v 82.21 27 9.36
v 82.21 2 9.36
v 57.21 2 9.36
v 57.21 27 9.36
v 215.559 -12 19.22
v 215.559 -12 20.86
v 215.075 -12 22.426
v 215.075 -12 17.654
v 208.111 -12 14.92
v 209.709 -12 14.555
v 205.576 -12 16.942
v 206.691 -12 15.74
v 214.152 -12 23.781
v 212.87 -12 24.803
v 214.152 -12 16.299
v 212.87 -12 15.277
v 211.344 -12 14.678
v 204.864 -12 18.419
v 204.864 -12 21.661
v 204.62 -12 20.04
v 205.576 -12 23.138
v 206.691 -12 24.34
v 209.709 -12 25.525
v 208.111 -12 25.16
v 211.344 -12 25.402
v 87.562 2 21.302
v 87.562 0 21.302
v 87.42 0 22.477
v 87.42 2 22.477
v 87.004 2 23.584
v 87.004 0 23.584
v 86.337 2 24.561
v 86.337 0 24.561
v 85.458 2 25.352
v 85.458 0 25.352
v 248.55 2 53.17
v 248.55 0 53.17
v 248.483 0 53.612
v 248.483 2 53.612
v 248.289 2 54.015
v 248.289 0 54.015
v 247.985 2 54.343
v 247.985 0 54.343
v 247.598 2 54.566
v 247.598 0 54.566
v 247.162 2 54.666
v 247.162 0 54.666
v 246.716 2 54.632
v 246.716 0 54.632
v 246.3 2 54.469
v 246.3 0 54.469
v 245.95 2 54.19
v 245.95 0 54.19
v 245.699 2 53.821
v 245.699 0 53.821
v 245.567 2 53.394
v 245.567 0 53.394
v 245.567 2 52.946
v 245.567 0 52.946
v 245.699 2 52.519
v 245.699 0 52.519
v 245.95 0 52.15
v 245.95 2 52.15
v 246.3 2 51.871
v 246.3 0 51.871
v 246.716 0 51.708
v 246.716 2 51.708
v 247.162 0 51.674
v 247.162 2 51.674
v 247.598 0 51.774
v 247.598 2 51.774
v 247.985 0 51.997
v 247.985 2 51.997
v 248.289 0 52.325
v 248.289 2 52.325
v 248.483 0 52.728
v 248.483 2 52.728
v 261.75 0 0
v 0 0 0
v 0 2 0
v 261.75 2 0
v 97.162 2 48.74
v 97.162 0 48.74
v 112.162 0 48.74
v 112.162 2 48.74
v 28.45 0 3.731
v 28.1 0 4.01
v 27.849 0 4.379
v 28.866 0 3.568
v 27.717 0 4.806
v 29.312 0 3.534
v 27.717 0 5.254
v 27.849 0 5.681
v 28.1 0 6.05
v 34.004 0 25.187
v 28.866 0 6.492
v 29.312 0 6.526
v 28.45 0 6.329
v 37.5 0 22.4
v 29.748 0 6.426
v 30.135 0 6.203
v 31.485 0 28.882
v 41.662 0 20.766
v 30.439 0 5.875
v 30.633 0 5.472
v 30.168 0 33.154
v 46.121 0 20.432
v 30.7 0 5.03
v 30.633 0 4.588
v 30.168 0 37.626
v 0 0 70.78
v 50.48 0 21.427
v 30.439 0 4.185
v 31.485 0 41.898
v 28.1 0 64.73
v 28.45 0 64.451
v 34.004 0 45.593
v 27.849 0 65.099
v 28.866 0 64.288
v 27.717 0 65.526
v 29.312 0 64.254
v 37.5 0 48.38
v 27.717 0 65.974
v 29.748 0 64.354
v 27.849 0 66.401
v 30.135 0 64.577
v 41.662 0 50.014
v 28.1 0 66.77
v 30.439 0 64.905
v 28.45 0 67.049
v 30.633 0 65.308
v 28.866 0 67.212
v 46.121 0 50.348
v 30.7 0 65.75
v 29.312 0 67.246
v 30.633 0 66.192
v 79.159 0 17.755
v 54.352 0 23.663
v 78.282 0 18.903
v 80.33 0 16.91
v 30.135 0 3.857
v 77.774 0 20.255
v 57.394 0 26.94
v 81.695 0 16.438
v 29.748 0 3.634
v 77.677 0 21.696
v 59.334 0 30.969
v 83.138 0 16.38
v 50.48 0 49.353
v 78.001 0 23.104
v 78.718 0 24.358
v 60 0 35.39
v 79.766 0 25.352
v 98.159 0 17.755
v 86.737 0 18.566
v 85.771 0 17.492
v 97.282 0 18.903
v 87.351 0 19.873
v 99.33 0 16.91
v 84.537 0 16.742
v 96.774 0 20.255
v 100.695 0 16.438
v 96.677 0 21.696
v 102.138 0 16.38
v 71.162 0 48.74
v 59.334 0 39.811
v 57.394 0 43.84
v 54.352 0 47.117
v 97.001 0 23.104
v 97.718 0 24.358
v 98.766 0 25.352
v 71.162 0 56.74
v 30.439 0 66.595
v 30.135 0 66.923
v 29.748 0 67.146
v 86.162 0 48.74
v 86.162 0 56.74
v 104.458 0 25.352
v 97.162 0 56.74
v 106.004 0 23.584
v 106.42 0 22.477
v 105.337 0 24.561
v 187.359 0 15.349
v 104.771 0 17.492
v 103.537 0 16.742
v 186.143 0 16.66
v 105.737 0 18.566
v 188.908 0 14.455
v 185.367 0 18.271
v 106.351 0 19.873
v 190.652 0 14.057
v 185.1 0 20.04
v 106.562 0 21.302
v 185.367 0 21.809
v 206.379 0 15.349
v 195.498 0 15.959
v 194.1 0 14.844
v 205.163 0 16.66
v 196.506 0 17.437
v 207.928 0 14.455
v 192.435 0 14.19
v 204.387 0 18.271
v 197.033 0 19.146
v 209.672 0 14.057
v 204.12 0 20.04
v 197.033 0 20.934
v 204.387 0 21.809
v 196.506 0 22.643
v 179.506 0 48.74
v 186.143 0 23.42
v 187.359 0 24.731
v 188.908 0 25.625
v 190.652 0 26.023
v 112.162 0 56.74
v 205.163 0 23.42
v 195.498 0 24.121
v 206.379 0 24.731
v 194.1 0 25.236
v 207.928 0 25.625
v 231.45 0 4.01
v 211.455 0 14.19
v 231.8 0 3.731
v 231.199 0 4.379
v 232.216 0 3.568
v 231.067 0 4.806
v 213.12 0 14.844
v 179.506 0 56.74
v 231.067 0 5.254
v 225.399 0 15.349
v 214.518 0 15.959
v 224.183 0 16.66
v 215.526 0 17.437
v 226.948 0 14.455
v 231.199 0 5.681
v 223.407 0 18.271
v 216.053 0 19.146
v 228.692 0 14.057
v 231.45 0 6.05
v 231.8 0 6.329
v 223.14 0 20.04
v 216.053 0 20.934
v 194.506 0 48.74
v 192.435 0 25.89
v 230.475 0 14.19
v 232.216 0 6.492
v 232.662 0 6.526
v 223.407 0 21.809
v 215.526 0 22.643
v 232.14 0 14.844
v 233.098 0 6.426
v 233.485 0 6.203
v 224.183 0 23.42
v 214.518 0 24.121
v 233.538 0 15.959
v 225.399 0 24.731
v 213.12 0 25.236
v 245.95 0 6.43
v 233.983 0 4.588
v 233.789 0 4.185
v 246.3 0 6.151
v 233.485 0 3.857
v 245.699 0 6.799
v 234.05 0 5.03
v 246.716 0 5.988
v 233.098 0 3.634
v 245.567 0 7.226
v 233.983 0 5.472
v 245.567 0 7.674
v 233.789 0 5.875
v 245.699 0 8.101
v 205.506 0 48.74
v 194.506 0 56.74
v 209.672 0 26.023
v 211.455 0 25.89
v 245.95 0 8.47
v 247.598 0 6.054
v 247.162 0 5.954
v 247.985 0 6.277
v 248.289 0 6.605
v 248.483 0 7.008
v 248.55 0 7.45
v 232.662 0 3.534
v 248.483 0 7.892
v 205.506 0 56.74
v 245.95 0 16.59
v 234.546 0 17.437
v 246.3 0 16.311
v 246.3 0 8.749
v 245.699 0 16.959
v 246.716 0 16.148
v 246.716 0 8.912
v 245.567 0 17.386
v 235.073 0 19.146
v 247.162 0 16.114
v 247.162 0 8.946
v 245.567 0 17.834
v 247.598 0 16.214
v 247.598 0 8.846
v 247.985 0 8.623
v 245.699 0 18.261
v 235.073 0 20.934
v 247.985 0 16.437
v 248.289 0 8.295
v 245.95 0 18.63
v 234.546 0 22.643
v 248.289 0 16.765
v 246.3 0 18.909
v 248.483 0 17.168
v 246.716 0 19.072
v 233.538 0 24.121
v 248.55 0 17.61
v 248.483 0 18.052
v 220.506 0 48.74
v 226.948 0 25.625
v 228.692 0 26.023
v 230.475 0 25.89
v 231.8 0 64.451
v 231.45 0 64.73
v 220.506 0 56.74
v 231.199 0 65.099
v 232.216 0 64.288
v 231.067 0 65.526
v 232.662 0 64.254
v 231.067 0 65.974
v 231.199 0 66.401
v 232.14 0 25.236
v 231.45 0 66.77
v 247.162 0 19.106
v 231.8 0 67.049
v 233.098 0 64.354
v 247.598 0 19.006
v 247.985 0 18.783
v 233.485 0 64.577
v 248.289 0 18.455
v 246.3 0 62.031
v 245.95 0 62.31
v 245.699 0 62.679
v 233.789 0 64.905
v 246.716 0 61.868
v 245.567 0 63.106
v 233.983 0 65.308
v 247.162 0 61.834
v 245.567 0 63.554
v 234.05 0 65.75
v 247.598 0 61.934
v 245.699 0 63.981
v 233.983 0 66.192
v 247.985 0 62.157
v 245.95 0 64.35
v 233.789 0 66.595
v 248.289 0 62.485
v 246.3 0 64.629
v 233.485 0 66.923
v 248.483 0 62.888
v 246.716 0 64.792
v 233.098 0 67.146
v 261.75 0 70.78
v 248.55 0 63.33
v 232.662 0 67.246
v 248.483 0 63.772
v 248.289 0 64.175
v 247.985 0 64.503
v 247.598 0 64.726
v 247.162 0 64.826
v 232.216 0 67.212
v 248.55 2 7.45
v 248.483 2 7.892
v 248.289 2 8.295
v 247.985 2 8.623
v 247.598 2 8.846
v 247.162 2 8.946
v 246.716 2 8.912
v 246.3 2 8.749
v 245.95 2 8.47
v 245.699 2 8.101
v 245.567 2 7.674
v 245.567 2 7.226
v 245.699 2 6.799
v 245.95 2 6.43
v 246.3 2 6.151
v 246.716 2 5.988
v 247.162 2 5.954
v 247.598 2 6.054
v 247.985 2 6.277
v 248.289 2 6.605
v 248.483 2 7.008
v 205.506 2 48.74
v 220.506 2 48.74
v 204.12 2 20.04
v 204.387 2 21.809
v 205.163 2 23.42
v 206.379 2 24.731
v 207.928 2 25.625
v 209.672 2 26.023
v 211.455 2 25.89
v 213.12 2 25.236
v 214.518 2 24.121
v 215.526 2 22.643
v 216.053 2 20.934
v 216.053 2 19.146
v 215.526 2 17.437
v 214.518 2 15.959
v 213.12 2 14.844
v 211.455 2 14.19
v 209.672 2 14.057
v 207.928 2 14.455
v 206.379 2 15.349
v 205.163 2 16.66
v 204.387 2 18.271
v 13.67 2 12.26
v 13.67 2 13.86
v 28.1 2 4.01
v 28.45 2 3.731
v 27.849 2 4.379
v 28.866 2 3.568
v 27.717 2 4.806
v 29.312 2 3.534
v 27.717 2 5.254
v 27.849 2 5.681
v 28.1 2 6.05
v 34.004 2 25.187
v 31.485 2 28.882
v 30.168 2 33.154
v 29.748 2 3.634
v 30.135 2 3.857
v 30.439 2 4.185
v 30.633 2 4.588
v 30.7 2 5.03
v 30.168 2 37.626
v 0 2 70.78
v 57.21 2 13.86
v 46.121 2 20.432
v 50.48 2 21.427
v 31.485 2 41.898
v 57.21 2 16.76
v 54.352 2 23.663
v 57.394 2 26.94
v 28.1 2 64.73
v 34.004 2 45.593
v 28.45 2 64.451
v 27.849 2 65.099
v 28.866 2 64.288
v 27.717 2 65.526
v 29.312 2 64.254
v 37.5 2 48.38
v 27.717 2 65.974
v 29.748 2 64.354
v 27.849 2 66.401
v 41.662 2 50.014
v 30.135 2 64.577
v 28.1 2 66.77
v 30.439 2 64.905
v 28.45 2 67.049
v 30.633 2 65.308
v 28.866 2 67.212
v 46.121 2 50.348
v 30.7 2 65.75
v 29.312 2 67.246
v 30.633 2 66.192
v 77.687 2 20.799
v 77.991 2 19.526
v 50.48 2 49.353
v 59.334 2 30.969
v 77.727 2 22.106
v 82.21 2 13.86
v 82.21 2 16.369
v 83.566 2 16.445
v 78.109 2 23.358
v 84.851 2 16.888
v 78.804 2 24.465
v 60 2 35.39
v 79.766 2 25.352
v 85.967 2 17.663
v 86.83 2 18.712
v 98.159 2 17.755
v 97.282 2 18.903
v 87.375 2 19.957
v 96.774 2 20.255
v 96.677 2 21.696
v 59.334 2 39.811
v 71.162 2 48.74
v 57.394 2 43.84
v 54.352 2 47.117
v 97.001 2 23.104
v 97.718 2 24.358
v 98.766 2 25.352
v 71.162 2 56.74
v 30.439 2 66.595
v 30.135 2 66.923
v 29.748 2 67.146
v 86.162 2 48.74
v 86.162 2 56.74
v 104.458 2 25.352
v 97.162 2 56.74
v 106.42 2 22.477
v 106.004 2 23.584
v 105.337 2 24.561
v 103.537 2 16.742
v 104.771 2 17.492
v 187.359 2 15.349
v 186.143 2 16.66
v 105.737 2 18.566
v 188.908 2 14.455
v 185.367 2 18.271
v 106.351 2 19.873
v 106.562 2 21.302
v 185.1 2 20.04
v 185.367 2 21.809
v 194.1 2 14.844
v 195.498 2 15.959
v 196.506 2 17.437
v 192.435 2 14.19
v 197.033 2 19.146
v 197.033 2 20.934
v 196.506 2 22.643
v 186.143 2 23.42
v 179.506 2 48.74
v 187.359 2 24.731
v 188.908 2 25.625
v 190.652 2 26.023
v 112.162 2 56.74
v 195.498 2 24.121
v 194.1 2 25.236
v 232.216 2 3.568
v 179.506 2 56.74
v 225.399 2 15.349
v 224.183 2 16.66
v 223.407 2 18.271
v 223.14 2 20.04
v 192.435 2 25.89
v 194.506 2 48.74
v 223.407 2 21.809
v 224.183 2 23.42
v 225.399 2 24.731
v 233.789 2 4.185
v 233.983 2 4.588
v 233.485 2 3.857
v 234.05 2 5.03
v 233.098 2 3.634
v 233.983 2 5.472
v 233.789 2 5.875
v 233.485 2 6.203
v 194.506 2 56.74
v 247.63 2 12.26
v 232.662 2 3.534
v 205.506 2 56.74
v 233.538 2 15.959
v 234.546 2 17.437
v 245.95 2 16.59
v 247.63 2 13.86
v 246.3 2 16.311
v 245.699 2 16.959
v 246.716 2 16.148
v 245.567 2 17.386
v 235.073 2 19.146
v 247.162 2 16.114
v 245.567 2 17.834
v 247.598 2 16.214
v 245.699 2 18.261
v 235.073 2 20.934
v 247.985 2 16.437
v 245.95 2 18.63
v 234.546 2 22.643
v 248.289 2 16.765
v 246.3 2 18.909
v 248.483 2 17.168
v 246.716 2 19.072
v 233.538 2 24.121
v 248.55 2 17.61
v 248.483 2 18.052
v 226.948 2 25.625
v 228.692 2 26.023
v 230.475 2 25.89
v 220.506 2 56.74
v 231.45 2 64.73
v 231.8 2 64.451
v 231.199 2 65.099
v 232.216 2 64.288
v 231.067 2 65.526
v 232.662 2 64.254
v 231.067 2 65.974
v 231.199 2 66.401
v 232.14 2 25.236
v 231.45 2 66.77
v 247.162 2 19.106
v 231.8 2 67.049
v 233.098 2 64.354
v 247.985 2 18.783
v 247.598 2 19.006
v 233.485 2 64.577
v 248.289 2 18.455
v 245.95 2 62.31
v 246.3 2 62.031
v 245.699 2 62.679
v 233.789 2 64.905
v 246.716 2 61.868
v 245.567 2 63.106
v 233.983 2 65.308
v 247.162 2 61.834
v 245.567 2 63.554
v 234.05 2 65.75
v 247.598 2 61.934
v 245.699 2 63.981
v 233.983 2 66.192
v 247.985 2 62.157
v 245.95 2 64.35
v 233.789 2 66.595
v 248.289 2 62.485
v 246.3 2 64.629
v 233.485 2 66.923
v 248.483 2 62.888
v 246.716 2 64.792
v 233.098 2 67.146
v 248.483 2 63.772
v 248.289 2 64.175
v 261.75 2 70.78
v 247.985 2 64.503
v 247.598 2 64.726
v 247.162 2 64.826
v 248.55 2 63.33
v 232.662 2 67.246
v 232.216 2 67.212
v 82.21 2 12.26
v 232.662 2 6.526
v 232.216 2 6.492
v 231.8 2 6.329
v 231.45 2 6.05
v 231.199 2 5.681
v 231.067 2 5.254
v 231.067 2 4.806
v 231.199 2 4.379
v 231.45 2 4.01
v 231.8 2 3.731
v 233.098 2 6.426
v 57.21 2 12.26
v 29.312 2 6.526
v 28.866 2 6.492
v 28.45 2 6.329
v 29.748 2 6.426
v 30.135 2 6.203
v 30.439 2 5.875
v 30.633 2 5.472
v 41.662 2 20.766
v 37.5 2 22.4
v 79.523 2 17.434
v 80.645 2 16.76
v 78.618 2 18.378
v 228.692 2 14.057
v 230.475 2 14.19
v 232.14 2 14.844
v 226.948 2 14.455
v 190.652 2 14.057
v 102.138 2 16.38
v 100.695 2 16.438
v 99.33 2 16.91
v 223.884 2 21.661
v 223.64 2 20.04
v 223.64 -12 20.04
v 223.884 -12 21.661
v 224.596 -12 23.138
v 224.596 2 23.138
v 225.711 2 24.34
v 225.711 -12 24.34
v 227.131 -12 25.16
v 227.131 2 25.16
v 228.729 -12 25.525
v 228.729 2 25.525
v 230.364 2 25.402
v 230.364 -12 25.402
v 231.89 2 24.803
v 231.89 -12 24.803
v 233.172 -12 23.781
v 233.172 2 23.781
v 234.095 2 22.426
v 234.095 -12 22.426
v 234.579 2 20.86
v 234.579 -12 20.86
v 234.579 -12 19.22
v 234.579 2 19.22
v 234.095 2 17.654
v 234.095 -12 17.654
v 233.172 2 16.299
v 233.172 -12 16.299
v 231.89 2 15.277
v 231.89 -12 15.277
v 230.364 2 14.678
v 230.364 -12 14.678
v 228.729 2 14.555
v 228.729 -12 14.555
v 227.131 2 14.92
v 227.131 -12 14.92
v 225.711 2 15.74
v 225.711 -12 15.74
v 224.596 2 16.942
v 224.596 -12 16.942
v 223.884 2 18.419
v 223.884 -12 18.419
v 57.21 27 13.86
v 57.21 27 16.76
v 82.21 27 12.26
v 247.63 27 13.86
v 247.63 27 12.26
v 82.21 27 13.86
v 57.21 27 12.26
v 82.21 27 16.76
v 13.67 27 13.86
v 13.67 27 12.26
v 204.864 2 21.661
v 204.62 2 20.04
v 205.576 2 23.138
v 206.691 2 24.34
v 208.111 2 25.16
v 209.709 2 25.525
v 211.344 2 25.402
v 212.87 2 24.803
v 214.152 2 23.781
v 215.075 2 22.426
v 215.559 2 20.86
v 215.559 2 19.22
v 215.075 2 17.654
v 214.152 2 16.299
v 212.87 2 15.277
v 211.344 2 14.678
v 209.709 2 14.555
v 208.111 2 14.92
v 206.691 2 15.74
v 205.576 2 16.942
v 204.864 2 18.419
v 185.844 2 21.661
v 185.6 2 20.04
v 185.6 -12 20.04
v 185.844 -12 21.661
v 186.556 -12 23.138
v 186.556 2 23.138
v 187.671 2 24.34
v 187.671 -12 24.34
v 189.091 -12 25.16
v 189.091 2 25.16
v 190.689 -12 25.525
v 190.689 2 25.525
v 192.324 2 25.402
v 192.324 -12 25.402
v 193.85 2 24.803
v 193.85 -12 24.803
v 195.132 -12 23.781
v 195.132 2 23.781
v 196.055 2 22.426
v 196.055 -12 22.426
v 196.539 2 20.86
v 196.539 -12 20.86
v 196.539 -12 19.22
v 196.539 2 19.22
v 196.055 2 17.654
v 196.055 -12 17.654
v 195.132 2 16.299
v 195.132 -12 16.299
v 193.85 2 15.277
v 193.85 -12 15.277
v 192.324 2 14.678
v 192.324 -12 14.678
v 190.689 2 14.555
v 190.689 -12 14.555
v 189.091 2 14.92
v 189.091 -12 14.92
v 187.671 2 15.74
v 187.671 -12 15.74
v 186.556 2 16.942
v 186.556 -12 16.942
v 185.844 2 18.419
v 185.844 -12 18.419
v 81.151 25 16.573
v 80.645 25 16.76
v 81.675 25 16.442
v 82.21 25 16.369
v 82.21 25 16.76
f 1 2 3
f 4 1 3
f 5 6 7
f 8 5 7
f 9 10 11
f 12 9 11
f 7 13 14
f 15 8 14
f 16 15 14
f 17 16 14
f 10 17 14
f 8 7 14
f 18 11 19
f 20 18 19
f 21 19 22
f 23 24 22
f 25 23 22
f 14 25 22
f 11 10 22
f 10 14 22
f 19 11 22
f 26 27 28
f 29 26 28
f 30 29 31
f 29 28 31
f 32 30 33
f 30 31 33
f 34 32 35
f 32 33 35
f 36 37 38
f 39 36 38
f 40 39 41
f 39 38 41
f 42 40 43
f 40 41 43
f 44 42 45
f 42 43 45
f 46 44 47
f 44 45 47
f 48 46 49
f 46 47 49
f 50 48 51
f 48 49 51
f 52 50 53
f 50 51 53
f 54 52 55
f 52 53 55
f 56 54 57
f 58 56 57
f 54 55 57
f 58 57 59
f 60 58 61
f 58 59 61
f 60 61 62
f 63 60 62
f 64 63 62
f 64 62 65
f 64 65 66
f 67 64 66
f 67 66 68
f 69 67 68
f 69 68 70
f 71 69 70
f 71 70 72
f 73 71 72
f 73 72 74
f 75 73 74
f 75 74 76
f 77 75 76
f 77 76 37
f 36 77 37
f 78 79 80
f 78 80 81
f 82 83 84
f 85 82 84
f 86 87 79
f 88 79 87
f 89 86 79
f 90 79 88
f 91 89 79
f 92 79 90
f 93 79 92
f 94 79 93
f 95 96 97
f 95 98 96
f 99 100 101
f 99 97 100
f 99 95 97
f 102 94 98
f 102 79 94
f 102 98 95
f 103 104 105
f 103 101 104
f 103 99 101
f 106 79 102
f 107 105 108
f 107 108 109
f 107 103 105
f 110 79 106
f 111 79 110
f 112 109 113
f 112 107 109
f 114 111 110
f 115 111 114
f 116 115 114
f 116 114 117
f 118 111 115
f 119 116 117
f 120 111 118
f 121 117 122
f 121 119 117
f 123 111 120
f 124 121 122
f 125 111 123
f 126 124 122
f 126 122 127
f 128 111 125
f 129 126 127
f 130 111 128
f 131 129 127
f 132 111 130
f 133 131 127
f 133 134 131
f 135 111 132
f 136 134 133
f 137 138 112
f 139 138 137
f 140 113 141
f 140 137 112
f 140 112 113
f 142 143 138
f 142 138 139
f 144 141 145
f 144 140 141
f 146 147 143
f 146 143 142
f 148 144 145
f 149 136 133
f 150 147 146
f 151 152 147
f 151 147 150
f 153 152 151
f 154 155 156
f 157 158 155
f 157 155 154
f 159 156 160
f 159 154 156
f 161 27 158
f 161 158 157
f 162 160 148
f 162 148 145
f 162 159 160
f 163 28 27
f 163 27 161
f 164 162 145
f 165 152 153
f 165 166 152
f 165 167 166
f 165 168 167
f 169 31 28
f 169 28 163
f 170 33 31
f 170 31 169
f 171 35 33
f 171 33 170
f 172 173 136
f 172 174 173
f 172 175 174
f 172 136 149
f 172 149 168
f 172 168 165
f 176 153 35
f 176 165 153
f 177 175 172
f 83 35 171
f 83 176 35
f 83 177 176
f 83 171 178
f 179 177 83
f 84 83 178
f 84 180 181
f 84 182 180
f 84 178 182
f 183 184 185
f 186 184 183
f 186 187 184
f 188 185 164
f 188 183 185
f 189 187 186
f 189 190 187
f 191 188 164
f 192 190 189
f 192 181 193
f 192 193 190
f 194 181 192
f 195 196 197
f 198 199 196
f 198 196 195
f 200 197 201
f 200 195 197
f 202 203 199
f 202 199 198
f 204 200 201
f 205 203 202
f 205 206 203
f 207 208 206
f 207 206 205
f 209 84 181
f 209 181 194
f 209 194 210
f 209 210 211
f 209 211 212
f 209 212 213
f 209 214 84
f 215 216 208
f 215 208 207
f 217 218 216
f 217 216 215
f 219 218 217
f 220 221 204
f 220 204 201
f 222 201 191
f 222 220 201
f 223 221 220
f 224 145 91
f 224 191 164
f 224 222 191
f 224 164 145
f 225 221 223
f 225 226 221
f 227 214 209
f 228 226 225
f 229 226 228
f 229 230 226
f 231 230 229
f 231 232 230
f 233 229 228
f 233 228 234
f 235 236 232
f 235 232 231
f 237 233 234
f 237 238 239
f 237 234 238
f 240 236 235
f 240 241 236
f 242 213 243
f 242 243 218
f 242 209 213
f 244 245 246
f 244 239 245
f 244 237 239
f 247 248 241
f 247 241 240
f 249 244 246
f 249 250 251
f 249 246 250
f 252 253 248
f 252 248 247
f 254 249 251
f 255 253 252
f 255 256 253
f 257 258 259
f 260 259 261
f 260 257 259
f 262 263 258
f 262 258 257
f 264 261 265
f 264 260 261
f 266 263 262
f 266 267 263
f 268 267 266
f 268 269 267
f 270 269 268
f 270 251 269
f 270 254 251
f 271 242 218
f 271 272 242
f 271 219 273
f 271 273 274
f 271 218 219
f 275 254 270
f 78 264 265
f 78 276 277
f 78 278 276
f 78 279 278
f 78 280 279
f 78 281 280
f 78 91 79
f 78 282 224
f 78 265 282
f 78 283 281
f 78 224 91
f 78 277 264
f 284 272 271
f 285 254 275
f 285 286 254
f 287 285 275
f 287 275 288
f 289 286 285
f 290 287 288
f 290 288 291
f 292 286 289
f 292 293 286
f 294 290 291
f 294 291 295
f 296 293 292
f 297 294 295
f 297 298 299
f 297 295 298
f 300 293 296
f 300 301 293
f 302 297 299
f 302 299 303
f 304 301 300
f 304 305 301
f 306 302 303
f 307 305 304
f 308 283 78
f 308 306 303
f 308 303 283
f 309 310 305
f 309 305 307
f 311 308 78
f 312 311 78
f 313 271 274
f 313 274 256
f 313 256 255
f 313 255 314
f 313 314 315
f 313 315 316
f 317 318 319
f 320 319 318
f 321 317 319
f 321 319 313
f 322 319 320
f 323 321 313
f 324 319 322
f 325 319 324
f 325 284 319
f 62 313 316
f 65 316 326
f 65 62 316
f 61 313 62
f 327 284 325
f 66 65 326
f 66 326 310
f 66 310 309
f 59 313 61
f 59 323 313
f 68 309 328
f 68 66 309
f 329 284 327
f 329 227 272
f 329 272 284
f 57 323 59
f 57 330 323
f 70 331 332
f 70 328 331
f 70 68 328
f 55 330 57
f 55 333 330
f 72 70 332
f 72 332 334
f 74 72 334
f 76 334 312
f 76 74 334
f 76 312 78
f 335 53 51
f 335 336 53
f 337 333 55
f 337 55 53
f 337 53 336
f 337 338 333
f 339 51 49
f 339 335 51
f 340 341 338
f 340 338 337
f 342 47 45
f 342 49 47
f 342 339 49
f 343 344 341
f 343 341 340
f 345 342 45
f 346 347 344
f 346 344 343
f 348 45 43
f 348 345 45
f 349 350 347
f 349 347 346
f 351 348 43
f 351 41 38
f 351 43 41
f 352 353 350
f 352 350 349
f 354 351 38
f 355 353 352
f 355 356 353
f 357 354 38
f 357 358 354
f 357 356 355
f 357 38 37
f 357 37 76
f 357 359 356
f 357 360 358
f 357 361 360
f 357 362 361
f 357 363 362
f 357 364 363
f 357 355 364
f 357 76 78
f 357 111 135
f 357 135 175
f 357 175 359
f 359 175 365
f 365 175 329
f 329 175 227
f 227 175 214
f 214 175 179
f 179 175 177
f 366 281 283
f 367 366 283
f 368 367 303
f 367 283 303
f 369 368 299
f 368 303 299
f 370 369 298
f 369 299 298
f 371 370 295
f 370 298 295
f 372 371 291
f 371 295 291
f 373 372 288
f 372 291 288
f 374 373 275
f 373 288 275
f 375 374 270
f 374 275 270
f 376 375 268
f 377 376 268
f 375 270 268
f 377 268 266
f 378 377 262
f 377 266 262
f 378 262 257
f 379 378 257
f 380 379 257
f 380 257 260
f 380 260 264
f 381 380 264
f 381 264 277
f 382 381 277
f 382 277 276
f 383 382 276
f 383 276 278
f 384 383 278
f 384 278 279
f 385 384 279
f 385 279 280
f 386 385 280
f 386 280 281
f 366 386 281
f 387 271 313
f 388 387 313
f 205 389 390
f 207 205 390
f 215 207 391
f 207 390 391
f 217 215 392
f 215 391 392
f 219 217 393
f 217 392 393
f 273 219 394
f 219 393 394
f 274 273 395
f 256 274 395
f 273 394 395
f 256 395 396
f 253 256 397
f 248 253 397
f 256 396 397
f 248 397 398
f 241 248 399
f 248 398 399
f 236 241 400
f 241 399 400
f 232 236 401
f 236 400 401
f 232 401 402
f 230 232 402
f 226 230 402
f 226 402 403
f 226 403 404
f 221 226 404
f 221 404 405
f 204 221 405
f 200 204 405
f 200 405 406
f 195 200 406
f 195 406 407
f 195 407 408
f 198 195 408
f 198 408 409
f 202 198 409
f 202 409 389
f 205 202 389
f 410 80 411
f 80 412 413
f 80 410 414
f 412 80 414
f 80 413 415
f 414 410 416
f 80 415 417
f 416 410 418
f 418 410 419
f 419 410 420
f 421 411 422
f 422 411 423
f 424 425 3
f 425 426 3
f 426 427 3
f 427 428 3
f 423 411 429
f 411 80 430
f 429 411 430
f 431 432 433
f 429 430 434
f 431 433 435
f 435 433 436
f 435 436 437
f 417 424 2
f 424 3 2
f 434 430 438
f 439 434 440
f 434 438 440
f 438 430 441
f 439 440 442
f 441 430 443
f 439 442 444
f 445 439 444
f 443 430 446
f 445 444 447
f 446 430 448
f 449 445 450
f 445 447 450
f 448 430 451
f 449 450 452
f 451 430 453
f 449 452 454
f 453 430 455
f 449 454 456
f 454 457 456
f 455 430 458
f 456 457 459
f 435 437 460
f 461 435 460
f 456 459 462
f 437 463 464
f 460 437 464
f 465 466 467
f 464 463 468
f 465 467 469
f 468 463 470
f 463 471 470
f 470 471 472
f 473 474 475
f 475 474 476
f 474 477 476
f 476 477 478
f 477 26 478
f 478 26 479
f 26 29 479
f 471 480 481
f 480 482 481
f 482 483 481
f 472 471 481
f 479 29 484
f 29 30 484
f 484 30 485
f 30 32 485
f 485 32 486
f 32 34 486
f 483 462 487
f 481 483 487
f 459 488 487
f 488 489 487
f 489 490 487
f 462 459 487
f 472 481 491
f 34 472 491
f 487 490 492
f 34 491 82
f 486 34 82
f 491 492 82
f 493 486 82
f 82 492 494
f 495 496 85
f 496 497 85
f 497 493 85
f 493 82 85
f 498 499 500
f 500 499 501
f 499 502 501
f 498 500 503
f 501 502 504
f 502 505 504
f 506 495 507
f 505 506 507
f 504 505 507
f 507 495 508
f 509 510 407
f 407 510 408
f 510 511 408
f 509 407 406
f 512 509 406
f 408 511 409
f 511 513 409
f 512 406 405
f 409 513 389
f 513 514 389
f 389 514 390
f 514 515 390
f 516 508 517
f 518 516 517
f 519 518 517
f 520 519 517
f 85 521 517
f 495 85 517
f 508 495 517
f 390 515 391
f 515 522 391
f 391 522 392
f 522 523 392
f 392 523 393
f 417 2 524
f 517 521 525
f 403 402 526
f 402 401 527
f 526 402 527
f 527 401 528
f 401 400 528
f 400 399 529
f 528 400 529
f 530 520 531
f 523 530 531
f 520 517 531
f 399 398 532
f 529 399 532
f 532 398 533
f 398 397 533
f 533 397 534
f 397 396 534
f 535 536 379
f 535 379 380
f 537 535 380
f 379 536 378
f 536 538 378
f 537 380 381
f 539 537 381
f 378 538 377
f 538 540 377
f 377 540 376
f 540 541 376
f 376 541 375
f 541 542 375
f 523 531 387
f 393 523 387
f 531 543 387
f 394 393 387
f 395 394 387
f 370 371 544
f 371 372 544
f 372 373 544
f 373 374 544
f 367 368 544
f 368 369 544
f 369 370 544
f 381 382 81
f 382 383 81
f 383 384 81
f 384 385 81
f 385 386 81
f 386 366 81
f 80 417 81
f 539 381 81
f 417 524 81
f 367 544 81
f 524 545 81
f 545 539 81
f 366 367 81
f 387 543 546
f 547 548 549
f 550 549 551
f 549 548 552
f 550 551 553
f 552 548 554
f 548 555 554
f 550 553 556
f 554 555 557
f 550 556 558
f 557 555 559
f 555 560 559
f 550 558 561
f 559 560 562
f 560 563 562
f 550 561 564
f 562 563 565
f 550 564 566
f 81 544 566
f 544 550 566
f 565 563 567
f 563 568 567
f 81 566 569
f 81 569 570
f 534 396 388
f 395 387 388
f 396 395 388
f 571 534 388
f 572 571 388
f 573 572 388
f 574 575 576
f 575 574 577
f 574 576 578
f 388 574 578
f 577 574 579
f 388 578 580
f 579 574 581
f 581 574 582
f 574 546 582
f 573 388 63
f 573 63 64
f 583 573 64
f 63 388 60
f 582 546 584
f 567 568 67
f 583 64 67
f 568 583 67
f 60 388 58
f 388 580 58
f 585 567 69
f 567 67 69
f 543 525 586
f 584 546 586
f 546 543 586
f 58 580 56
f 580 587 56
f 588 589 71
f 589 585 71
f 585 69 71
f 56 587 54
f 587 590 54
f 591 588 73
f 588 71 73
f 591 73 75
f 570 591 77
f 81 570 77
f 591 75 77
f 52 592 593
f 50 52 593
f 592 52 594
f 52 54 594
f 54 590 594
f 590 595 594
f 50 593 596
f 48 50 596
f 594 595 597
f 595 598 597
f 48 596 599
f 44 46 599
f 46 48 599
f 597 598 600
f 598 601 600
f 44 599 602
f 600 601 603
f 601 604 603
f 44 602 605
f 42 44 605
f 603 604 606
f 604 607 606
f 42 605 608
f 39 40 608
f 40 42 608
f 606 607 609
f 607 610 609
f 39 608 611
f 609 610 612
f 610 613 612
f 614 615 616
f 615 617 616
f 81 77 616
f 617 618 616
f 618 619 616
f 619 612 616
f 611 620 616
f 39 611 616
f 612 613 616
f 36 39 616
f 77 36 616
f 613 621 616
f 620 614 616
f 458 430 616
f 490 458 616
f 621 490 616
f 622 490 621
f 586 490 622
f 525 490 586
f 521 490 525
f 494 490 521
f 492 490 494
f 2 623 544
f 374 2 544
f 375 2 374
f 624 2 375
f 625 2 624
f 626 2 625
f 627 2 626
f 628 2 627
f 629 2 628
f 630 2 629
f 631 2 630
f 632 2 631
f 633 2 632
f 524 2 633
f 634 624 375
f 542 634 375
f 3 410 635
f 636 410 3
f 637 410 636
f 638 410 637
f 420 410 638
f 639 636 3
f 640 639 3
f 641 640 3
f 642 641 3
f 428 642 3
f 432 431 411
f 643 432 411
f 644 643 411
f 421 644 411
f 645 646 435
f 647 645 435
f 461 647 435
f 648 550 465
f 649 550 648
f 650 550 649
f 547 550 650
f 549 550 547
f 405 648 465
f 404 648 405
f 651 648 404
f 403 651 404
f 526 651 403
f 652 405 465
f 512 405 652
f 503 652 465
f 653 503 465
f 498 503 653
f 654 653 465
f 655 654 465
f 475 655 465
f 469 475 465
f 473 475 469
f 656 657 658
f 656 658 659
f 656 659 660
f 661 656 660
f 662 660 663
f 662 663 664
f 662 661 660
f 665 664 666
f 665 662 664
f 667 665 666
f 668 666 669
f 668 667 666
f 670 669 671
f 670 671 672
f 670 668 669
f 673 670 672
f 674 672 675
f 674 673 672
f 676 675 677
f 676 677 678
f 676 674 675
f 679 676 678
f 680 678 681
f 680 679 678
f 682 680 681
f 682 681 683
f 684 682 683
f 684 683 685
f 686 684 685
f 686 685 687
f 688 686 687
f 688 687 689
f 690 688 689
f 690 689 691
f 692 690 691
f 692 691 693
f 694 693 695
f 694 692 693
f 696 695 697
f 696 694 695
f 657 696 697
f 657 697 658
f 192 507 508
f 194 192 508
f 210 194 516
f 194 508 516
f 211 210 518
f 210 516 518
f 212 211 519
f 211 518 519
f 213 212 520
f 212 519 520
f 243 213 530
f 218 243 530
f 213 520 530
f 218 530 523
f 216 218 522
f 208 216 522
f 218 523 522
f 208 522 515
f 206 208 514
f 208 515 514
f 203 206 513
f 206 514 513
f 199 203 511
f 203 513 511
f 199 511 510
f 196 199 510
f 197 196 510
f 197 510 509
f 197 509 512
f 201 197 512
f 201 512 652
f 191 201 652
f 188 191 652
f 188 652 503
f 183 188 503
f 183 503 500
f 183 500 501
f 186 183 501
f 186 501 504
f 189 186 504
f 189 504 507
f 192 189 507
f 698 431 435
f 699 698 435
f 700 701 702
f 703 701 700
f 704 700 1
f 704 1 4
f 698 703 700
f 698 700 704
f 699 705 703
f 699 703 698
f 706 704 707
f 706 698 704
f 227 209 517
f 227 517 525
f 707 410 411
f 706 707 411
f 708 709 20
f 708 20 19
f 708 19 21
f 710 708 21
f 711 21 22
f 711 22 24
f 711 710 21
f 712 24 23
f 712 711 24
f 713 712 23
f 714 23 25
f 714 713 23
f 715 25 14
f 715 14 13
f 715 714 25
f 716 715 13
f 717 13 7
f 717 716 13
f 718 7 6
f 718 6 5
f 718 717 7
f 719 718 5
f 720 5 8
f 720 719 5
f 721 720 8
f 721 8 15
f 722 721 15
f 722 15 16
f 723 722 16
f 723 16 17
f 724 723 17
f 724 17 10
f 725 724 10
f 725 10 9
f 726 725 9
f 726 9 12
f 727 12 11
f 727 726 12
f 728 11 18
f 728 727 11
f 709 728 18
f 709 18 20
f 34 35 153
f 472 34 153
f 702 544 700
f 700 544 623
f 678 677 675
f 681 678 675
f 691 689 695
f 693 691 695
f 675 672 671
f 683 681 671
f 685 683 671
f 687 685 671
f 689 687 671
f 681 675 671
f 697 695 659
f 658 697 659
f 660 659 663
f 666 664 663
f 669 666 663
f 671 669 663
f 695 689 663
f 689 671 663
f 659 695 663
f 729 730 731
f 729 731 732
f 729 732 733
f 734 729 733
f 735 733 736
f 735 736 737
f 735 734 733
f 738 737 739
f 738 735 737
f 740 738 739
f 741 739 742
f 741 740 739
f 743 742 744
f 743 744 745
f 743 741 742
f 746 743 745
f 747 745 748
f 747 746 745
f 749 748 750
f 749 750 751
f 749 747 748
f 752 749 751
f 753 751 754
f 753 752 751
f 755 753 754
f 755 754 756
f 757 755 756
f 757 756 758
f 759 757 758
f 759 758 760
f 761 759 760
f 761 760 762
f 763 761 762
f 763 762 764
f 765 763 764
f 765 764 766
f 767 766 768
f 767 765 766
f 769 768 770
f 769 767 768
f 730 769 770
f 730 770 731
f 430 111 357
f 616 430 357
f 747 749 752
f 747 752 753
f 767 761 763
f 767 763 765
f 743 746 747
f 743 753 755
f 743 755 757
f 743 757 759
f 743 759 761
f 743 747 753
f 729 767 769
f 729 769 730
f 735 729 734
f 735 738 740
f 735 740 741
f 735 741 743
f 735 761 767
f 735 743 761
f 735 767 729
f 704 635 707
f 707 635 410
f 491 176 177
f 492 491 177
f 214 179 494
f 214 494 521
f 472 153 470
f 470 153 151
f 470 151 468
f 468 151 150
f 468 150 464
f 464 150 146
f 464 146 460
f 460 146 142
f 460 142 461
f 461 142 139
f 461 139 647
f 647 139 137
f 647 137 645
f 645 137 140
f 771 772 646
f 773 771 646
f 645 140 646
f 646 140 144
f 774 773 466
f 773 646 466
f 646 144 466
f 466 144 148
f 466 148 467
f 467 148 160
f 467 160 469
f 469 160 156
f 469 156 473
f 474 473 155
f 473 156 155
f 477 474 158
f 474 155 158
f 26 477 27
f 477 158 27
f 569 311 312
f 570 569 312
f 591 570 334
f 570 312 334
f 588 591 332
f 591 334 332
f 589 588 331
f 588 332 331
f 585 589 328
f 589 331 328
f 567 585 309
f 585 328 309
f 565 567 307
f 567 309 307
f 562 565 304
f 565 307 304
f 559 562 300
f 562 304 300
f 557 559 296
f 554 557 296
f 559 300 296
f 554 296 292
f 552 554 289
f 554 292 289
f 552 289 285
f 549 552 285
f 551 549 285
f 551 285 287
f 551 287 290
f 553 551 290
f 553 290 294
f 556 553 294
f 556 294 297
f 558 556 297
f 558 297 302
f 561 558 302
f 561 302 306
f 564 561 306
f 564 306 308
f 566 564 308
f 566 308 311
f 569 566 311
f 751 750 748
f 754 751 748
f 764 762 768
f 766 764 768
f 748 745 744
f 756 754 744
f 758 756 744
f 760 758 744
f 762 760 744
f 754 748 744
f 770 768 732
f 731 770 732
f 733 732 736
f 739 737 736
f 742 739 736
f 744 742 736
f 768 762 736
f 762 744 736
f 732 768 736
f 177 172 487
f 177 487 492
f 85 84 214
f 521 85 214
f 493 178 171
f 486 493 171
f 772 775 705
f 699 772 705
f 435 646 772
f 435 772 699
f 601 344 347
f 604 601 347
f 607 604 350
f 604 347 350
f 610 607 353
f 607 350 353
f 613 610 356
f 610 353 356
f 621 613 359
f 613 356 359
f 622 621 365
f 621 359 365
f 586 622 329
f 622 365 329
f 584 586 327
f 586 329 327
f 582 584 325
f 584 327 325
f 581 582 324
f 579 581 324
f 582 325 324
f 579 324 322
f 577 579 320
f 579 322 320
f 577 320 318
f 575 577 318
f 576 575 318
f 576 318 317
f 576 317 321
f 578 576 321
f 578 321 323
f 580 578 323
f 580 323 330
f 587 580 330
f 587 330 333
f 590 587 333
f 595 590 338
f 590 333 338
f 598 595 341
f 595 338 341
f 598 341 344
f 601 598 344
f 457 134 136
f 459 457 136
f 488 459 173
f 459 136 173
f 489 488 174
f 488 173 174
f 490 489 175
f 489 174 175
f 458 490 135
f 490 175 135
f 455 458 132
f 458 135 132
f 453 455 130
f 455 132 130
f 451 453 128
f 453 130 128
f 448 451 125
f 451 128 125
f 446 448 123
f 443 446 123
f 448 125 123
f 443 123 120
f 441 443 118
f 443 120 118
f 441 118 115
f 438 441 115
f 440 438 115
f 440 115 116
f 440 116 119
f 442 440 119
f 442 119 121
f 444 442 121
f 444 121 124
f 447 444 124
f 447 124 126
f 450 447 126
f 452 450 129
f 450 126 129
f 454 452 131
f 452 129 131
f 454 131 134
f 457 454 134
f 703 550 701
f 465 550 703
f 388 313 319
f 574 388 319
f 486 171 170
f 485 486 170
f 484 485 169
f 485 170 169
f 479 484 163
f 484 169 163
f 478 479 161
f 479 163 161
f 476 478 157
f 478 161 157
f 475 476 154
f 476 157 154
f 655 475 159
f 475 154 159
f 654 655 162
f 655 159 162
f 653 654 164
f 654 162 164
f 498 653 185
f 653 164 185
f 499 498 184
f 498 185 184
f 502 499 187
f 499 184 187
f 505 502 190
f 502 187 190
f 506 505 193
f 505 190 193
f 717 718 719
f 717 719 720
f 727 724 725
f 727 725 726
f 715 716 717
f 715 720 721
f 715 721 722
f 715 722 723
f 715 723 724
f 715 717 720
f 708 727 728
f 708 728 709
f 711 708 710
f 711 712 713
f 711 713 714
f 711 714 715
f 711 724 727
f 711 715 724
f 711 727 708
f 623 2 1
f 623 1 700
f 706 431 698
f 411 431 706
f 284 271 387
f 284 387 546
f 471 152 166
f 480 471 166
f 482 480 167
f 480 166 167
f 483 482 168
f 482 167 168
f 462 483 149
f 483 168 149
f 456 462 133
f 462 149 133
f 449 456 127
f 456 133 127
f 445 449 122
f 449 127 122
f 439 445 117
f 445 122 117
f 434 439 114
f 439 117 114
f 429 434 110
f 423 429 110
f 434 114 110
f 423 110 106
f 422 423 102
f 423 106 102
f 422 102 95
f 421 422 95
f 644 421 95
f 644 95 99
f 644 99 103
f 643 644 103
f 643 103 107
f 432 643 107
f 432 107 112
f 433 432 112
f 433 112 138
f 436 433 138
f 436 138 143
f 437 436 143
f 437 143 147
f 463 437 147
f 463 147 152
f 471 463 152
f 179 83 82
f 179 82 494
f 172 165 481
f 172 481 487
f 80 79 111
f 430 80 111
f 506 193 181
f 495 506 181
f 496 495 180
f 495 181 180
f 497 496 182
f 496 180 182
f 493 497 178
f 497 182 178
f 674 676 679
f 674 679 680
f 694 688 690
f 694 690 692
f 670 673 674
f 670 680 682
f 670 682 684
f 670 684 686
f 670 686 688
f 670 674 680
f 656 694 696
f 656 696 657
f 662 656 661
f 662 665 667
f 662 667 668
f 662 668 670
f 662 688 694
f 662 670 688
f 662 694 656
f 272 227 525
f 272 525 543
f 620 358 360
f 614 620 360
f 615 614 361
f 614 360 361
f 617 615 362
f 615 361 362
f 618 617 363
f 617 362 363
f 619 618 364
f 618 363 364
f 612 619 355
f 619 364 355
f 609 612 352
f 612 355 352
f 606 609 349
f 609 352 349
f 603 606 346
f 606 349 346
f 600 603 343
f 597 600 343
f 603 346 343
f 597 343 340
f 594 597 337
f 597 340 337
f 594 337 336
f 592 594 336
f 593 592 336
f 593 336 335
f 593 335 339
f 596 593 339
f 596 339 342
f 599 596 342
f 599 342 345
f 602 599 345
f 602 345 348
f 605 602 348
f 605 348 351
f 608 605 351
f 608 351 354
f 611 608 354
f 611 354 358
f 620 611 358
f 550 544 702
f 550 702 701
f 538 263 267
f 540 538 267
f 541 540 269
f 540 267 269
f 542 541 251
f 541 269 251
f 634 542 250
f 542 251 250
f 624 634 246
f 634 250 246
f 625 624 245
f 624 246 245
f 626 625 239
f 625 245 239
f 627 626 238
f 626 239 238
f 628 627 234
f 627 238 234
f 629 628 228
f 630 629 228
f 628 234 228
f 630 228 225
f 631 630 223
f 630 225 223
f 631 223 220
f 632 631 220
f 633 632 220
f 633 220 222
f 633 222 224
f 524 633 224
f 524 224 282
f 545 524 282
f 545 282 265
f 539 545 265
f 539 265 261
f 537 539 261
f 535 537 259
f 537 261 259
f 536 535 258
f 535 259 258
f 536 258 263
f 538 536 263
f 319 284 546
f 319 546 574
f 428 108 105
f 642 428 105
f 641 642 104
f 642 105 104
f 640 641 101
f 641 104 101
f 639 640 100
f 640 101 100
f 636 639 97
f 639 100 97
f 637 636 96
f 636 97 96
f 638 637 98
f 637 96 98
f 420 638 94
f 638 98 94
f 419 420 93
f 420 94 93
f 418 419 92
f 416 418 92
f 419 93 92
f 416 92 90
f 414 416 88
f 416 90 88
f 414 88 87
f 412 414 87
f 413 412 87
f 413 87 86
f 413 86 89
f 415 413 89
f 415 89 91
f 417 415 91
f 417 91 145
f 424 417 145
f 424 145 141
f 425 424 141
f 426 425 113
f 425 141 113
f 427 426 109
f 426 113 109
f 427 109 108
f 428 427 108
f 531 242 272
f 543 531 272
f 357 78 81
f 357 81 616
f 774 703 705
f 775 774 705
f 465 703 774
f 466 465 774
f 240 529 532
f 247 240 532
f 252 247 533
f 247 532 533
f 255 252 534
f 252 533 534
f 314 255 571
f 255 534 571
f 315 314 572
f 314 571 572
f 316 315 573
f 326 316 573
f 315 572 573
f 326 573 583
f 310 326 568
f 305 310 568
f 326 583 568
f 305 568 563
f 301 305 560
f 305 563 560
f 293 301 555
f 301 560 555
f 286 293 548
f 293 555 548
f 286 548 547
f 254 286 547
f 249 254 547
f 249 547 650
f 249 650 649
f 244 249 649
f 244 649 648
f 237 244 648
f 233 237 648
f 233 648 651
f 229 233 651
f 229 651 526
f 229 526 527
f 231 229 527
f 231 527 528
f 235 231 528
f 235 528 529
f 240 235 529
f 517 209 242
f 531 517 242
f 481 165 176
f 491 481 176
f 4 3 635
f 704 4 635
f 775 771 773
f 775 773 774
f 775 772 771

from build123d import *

# Parameters (mm, degrees)
F0_W      = 261.75
F0_H      = 70.78
F0_R      = 1.5
F1_DEPTH  = 2
F2_W      = 233.96
F2_H      = 1.6
F3_DEPTH  = 25
F4_W      = 25
F4_H      = 7.4
F5_DEPTH  = 25
F6_R      = 6
F7_DEPTH  = 25
F8_R      = 5.5
F9_DEPTH  = 14
F10_R     = 1.5
F11_DEPTH = 25
F12_R     = 15
F13_DEPTH = 25
F14_W     = 15
F14_H     = 8
F15_DEPTH = 25
F17_DEPTH = 25


with BuildPart() as f1:
    # F0 (on Front) → F1 (new body)
    with BuildSketch(Plane.XZ):
        with Locations((130.875, 35.39)):
            Rectangle(F0_W, F0_H)
        with Locations((29.2, 5.03)):
            Circle(F0_R, mode=Mode.SUBTRACT)
        with Locations((232.55, 5.03)):
            Circle(F0_R, mode=Mode.SUBTRACT)
        with Locations((29.2, 65.75)):
            Circle(F0_R, mode=Mode.SUBTRACT)
        with Locations((232.55, 65.75)):
            Circle(F0_R, mode=Mode.SUBTRACT)
    extrude(amount=-F1_DEPTH)

    # F2 (on face) → F3 (join)
    with BuildSketch(Plane(origin=(0, 2, 0), x_dir=(-1, 0, 0), z_dir=(0, 1, 0))):
        with Locations((-130.65, 13.06)):
            Rectangle(F2_W, F2_H)
    extrude(amount=F3_DEPTH)

    # F4 (on face) → F5 (join)
    with BuildSketch(Plane(origin=(0, 2, 0), x_dir=(-1, 0, 0), z_dir=(0, 1, 0))):
        with Locations((-69.71, 13.06)):
            Rectangle(F4_W, F4_H)
    extrude(amount=F5_DEPTH)

    # F6 (on face) → F7 (cut)
    with BuildSketch(Plane(origin=(0, 2, 0), x_dir=(-1, 0, 0), z_dir=(0, 1, 0))):
        with Locations((-229.14, 20.04)):
            Circle(F6_R)
        with Locations((-210.12, 20.04)):
            Circle(F6_R)
        with Locations((-191.1, 20.04)):
            Circle(F6_R)
    extrude(amount=-F7_DEPTH, mode=Mode.SUBTRACT)

    # F10 (on face) → F11 (cut)
    with BuildSketch(Plane.XZ):
        with Locations((247.05, 7.45)):
            Circle(F10_R)
        with Locations((247.05, 17.61)):
            Circle(F10_R)
        with Locations((247.05, 53.17)):
            Circle(F10_R)
        with Locations((247.05, 63.33)):
            Circle(F10_R)
    extrude(amount=-F11_DEPTH, mode=Mode.SUBTRACT)

    # F12 (on face) → F13 (cut)
    with BuildSketch(Plane.XZ):
        with Locations((45, 35.39)):
            Circle(F12_R)
    extrude(amount=-F13_DEPTH, mode=Mode.SUBTRACT)

    # F14 (on face) → F15 (cut)
    with BuildSketch(Plane.XZ):
        with Locations((78.662411, 52.740127)):
            Rectangle(F14_W, F14_H)
        with Locations((104.662411, 52.740127)):
            Rectangle(F14_W, F14_H)
        with Locations((187.005974, 52.740127)):
            Rectangle(F14_W, F14_H)
        with Locations((213.005974, 52.740127)):
            Rectangle(F14_W, F14_H)
    extrude(amount=-F15_DEPTH, mode=Mode.SUBTRACT)

    # F16 (on face) → F17 (cut)
    with BuildSketch(Plane.XZ):
        with BuildLine():
            ThreePointArc((79.765705, 25.352355), (80.329809, 16.909723), (87.561755, 21.302355))
            ThreePointArc((87.561755, 21.302355), (87.004387, 23.584301), (85.457804, 25.352355))
            Line((85.457804, 25.352355), (79.765705, 25.352355))
        make_face()
        with BuildLine():
            Line((104.457804, 25.352355), (98.765705, 25.352355))
            ThreePointArc((98.765705, 25.352355), (99.329809, 16.909723), (106.561755, 21.302355))
            ThreePointArc((106.561755, 21.302355), (106.004387, 23.584301), (104.457804, 25.352355))
        make_face()
    extrude(amount=-F17_DEPTH, mode=Mode.SUBTRACT)


with BuildPart() as f9:
    # F8 (on face) → F9 (new body)
    with BuildSketch(Plane(origin=(0, 2, 0), x_dir=(-1, 0, 0), z_dir=(0, 1, 0))):
        with Locations((-229.14, 20.04)):
            Circle(F8_R)
        with Locations((-210.12, 20.04)):
            Circle(F8_R)
        with Locations((-191.1, 20.04)):
            Circle(F8_R)
    extrude(amount=-F9_DEPTH)


solid = Compound([f1.part, f9.part])
